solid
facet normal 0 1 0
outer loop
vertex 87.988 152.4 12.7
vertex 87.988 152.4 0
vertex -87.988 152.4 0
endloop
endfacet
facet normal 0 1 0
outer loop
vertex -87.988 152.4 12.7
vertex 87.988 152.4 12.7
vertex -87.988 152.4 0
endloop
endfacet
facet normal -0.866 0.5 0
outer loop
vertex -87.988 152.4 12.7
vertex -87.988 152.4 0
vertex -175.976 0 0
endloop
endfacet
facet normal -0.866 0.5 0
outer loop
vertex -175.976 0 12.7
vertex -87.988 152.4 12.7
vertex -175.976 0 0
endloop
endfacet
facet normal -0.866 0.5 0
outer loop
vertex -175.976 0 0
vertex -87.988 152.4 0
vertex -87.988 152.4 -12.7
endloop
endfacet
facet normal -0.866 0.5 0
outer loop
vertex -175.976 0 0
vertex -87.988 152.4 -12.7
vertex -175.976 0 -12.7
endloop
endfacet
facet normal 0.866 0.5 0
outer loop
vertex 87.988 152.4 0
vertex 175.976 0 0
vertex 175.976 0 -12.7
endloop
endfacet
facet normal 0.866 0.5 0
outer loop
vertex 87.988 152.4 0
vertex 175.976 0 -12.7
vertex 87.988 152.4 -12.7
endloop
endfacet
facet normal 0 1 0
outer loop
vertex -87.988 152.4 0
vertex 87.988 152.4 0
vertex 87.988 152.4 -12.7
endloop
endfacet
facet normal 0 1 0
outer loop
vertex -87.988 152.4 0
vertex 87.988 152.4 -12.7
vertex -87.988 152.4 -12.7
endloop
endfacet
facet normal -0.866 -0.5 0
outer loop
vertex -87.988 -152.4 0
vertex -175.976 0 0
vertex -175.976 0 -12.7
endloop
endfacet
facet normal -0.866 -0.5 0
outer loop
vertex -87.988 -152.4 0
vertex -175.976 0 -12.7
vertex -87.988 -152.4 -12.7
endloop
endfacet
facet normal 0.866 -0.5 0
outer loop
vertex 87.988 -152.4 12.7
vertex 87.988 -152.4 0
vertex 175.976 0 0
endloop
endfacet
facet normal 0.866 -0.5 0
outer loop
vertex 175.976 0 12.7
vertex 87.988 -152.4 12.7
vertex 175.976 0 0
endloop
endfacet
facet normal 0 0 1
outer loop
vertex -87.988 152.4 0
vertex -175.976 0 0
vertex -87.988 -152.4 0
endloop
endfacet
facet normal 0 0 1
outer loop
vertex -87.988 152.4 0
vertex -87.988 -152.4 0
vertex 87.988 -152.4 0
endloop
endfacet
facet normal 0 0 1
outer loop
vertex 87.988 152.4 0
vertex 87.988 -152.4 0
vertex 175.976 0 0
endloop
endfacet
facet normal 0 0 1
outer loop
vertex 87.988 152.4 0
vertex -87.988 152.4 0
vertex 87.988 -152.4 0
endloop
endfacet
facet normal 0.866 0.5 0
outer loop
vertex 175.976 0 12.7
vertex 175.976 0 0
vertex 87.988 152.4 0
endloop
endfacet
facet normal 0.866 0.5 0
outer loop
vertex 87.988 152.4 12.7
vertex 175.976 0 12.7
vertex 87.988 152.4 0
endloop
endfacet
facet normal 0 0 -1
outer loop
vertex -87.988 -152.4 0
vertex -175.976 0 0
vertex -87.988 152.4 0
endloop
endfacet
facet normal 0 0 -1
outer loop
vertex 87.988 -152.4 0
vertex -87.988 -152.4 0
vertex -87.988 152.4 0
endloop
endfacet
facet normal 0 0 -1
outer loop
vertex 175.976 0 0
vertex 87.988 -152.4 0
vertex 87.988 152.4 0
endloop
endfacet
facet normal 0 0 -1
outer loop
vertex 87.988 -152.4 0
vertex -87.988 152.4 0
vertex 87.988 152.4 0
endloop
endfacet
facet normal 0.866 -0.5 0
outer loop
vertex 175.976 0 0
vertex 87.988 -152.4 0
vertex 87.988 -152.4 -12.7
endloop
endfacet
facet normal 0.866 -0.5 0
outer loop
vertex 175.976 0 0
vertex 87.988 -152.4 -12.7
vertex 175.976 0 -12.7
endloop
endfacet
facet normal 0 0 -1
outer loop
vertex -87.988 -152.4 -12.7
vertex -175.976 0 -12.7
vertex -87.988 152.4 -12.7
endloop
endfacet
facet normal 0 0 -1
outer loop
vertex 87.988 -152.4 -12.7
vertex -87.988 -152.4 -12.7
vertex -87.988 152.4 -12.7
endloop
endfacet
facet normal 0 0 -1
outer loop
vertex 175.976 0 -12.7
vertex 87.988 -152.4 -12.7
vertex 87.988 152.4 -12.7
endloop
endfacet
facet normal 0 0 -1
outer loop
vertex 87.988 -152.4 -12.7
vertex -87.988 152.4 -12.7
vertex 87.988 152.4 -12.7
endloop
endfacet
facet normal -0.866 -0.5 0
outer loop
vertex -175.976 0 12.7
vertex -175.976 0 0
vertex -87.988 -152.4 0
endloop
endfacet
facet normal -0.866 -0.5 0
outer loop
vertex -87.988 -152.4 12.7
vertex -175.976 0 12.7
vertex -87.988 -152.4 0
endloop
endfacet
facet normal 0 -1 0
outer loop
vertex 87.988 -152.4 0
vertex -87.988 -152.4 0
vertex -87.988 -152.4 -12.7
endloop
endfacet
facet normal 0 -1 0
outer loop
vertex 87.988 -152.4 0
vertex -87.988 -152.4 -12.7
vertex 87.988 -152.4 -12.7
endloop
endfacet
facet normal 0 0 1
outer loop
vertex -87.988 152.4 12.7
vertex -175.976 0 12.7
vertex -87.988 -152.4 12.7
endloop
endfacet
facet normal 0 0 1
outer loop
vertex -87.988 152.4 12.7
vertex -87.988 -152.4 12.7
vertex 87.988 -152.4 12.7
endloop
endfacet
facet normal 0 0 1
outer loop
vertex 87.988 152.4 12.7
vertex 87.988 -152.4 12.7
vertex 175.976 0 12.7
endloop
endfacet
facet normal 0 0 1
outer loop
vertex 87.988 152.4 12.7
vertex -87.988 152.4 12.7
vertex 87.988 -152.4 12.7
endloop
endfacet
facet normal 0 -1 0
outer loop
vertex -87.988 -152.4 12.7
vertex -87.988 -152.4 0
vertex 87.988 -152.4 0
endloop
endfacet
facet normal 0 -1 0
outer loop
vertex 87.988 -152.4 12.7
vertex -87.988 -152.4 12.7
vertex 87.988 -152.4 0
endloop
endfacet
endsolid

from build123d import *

# Parameters (mm, degrees)
F1_DEPTH = 12.7
F2_DEPTH = 12.7


with BuildPart() as f1:
    # F0 (on Top) → F1 (new body)
    with BuildSketch(Plane.XY):
        with BuildLine():
            ThreePointArc((131.9822715367, -76.2), (147.2070959265, -39.4440224736), (152.4, 0))
            ThreePointArc((152.4, 0), (147.2070959265, 39.4440224736), (131.9822715367, 76.2))
            ThreePointArc((131.9822715367, 76.2), (76.2, 131.9822715367), (0, 152.4))
            ThreePointArc((0, 152.4), (-76.2, 131.9822715367), (-131.9822715367, 76.2))
            ThreePointArc((-131.9822715367, 76.2), (-152.4, 0), (-131.9822715367, -76.2))
            ThreePointArc((-131.9822715367, -76.2), (-76.2, -131.9822715367), (0, -152.4))
            ThreePointArc((0, -152.4), (76.2, -131.9822715367), (131.9822715367, -76.2))
        make_face()
        with BuildLine():
            Line((-87.9881810245, -152.4), (0, -152.4))
            ThreePointArc((0, -152.4), (-76.2, -131.9822715367), (-131.9822715367, -76.2))
            Line((-131.9822715367, -76.2), (-87.9881810245, -152.4))
        make_face()
        with BuildLine():
            ThreePointArc((-131.9822715367, -76.2), (-152.4, 0), (-131.9822715367, 76.2))
            Line((-131.9822715367, 76.2), (-175.976362049, 0))
            Line((-175.976362049, 0), (-131.9822715367, -76.2))
        make_face()
        with BuildLine():
            ThreePointArc((-131.9822715367, 76.2), (-76.2, 131.9822715367), (0, 152.4))
            Line((0, 152.4), (-86.7521613836, 152.4))
            Line((-86.7521613836, 152.4), (-87.9881810245, 152.4))
            Line((-87.9881810245, 152.4), (-131.9822715367, 76.2))
        make_face()
        with BuildLine():
            ThreePointArc((0, 152.4), (76.2, 131.9822715367), (131.9822715367, 76.2))
            Line((131.9822715367, 76.2), (87.9881810245, 152.4))
            Line((87.9881810245, 152.4), (0, 152.4))
        make_face()
        with BuildLine():
            ThreePointArc((131.9822715367, 76.2), (147.2070959265, 39.4440224736), (152.4, 0))
            ThreePointArc((152.4, 0), (147.2070959265, -39.4440224736), (131.9822715367, -76.2))
            Line((131.9822715367, -76.2), (175.976362049, 0))
            Line((175.976362049, 0), (131.9822715367, 76.2))
        make_face()
        with BuildLine():
            Line((87.9881810245, -152.4), (131.9822715367, -76.2))
            ThreePointArc((131.9822715367, -76.2), (76.2, -131.9822715367), (0, -152.4))
            Line((0, -152.4), (87.9881810245, -152.4))
        make_face()
    extrude(amount=F1_DEPTH)


with BuildPart() as f2:
    # F0 (on Top) → F2 (new body)
    with BuildSketch(Plane.XY):
        with BuildLine():
            ThreePointArc((131.9822715367, -76.2), (147.2070959265, -39.4440224736), (152.4, 0))
            ThreePointArc((152.4, 0), (147.2070959265, 39.4440224736), (131.9822715367, 76.2))
            ThreePointArc((131.9822715367, 76.2), (76.2, 131.9822715367), (0, 152.4))
            ThreePointArc((0, 152.4), (-76.2, 131.9822715367), (-131.9822715367, 76.2))
            ThreePointArc((-131.9822715367, 76.2), (-152.4, 0), (-131.9822715367, -76.2))
            ThreePointArc((-131.9822715367, -76.2), (-76.2, -131.9822715367), (0, -152.4))
            ThreePointArc((0, -152.4), (76.2, -131.9822715367), (131.9822715367, -76.2))
        make_face()
        with BuildLine():
            ThreePointArc((-131.9822715367, -76.2), (-152.4, 0), (-131.9822715367, 76.2))
            Line((-131.9822715367, 76.2), (-175.976362049, 0))
            Line((-175.976362049, 0), (-131.9822715367, -76.2))
        make_face()
        with BuildLine():
            ThreePointArc((-131.9822715367, 76.2), (-76.2, 131.9822715367), (0, 152.4))
            Line((0, 152.4), (-86.7521613836, 152.4))
            Line((-86.7521613836, 152.4), (-87.9881810245, 152.4))
            Line((-87.9881810245, 152.4), (-131.9822715367, 76.2))
        make_face()
        with BuildLine():
            ThreePointArc((0, 152.4), (76.2, 131.9822715367), (131.9822715367, 76.2))
            Line((131.9822715367, 76.2), (87.9881810245, 152.4))
            Line((87.9881810245, 152.4), (0, 152.4))
        make_face()
        with BuildLine():
            ThreePointArc((131.9822715367, 76.2), (147.2070959265, 39.4440224736), (152.4, 0))
            ThreePointArc((152.4, 0), (147.2070959265, -39.4440224736), (131.9822715367, -76.2))
            Line((131.9822715367, -76.2), (175.976362049, 0))
            Line((175.976362049, 0), (131.9822715367, 76.2))
        make_face()
        with BuildLine():
            Line((87.9881810245, -152.4), (131.9822715367, -76.2))
            ThreePointArc((131.9822715367, -76.2), (76.2, -131.9822715367), (0, -152.4))
            Line((0, -152.4), (87.9881810245, -152.4))
        make_face()
        with BuildLine():
            Line((-87.9881810245, -152.4), (0, -152.4))
            ThreePointArc((0, -152.4), (-76.2, -131.9822715367), (-131.9822715367, -76.2))
            Line((-131.9822715367, -76.2), (-87.9881810245, -152.4))
        make_face()
    extrude(amount=-F2_DEPTH)


solid = Compound([f1.part, f2.part])
